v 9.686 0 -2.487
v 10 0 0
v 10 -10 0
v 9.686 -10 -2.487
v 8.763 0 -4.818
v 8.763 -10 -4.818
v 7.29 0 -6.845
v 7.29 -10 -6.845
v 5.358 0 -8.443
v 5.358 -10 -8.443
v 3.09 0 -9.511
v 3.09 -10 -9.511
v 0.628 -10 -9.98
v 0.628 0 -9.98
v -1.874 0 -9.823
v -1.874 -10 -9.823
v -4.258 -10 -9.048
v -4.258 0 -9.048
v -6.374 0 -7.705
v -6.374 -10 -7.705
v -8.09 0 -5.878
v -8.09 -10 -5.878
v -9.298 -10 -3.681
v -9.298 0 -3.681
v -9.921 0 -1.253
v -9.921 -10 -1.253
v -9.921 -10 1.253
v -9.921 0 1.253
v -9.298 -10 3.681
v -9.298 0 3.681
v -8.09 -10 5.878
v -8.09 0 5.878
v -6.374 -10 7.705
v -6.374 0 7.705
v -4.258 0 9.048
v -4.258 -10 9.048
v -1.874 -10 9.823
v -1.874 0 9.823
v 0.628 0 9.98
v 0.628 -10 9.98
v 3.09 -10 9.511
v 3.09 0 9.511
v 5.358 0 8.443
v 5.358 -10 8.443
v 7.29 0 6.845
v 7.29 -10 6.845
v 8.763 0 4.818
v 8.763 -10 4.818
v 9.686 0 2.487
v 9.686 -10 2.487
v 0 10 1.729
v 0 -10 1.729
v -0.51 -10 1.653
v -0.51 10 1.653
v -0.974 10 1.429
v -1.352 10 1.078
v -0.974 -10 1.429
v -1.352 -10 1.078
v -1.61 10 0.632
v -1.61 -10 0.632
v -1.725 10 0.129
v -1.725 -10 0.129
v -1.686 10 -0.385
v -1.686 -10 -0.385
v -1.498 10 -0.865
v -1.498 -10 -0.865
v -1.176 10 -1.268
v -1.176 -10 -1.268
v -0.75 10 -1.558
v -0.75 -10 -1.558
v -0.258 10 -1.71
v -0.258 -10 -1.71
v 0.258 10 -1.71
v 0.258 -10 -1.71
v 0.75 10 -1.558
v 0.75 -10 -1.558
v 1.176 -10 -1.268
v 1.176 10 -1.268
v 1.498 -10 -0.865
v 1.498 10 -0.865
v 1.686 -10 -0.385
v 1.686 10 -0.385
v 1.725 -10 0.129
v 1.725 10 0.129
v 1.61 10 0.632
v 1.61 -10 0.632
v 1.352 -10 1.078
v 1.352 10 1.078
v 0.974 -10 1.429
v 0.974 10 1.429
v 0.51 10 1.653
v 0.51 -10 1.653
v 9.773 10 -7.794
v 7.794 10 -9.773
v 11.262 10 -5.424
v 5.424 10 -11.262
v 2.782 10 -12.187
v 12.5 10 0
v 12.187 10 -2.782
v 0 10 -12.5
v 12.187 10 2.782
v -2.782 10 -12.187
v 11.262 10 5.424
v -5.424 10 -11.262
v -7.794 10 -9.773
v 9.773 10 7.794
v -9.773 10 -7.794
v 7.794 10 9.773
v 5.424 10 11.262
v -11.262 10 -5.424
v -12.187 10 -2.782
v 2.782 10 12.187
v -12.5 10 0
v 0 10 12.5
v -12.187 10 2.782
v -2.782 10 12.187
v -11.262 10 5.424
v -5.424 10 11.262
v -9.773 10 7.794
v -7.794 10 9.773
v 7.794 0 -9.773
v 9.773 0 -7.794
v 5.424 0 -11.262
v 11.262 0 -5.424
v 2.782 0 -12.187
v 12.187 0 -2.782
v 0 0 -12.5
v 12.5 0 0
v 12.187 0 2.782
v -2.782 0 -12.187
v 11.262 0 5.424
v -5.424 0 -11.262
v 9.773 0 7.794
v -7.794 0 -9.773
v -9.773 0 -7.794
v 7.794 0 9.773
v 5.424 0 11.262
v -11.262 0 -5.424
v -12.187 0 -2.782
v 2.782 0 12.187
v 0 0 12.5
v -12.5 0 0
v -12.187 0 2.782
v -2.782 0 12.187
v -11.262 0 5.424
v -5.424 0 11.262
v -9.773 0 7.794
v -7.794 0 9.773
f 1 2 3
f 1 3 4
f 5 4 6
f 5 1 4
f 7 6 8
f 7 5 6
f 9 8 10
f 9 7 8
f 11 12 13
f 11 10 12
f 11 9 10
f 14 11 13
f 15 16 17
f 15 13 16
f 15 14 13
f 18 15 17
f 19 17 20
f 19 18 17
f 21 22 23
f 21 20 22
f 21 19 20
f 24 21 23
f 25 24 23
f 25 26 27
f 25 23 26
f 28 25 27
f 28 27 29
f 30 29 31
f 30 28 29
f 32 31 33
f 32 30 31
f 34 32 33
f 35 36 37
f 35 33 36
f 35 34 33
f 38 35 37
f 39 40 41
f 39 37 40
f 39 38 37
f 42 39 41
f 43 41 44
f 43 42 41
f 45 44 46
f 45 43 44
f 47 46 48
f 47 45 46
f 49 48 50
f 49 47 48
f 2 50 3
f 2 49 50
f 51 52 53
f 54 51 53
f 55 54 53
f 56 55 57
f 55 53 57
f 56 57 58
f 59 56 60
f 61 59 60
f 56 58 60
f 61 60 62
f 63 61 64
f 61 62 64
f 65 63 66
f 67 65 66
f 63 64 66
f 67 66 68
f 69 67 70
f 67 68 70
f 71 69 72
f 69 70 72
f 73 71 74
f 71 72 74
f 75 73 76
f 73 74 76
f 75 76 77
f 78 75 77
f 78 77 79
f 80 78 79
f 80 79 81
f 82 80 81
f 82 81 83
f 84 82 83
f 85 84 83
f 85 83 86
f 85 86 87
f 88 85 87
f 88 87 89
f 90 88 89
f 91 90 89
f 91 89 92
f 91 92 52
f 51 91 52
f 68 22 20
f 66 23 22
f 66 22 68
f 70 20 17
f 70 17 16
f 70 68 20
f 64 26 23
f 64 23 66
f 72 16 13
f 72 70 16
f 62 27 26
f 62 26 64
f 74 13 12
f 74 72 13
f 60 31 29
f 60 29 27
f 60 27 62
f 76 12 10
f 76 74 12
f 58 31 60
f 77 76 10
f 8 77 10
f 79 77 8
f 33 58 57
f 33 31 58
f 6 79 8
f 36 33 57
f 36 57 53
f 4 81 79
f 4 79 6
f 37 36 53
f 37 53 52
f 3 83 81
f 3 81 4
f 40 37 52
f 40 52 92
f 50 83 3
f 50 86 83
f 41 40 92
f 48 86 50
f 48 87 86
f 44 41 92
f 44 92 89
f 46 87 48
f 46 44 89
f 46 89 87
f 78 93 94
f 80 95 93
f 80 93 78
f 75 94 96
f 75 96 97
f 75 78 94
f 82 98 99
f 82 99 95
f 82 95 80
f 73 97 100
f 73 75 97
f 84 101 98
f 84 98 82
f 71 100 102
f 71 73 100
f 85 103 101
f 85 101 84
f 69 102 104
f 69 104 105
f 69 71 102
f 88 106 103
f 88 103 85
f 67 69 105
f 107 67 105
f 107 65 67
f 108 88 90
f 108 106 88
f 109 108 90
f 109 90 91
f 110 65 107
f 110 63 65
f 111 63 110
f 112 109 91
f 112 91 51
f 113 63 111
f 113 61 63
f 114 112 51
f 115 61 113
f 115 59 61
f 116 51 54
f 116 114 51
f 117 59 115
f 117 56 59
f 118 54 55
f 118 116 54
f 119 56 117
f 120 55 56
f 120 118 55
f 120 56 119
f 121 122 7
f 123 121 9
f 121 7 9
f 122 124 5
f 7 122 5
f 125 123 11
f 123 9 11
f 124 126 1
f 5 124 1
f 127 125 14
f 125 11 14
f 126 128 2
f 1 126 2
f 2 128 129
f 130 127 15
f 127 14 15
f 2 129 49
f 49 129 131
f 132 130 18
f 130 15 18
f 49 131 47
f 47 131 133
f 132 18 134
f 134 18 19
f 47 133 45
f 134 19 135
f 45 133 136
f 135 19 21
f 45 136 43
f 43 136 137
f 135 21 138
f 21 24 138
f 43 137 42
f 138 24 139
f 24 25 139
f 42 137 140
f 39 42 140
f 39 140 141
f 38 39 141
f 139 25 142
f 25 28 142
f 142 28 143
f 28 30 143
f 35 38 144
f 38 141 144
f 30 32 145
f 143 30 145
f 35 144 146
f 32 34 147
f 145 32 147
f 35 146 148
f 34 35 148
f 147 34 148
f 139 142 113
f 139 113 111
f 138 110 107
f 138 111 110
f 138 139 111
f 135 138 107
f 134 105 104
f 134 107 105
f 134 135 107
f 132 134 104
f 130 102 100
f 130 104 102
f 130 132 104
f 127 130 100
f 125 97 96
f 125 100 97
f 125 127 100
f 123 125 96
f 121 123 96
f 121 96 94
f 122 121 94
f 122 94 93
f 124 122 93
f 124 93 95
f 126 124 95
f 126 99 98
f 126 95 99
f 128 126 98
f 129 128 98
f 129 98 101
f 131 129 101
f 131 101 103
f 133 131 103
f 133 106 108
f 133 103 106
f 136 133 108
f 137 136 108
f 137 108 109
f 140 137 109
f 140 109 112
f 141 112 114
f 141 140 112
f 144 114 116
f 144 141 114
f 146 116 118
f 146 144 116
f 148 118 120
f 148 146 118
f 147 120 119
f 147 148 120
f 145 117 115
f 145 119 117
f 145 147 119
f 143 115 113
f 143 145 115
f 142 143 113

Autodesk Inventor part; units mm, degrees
ref_plane "YZ Plane" through (0, 0, 0) normal (1, 0, 0) x (0, 1, 0)
ref_plane "XZ Plane" through (0, 0, 0) normal (0, 1, 0) x (-1, 0, 0)
ref_plane "XY Plane" through (0, 0, 0) normal (0, 0, 1) x (1, 0, 0)
sketch "Sketch4" plane through (0, 0, 0) normal (0, 1, 0) x (-1, 0, 0)
  circle A0 centre (0, 0) radius 12.5
  dimension "d19" = 25
extrude "Extrusion2" add sketch "Sketch4" along normal blind 10
sketch "Sketch5" plane through (0, 0, 0) normal (0, -1, 0) x (1, 0, 0)
  circle A0 centre (0, 0) radius 10
  dimension "d22" = 20
extrude "Extrusion3" add sketch "Sketch5" along normal blind 10
sketch "Sketch6" plane through (0, 10, 0) normal (0, 1, 0) x (1, 0, 0)
  point P0 (0, 0)
  point P1 (0, 0)
hole "Hole2" at (0, 10, 0) direction (0, -1, 0) diameter 3.4587 end through all thread size "M4x0.5" class "6H" standard "ISO Metric profile"
equation "\"d30\" = Thickness"
equation "\"BendRadius\" = Thickness"
equation "\"BendReliefWidth\" = Thickness"
equation "\"BendReliefDepth\" = 0.5 * Thickness"
equation "\"CornerReliefSize\" = 4 * Thickness"
equation "\"MinimumRemnant\" = 2 * Thickness"
equation "\"TransitionRadius\" = BendRadius"
equation "\"JacobiRadiusSize\" = BendRadius"
equation "\"GapSize\" = Thickness"
equation "\"Thickness\" = 0.5"
properties part number "Output link probe hub"
